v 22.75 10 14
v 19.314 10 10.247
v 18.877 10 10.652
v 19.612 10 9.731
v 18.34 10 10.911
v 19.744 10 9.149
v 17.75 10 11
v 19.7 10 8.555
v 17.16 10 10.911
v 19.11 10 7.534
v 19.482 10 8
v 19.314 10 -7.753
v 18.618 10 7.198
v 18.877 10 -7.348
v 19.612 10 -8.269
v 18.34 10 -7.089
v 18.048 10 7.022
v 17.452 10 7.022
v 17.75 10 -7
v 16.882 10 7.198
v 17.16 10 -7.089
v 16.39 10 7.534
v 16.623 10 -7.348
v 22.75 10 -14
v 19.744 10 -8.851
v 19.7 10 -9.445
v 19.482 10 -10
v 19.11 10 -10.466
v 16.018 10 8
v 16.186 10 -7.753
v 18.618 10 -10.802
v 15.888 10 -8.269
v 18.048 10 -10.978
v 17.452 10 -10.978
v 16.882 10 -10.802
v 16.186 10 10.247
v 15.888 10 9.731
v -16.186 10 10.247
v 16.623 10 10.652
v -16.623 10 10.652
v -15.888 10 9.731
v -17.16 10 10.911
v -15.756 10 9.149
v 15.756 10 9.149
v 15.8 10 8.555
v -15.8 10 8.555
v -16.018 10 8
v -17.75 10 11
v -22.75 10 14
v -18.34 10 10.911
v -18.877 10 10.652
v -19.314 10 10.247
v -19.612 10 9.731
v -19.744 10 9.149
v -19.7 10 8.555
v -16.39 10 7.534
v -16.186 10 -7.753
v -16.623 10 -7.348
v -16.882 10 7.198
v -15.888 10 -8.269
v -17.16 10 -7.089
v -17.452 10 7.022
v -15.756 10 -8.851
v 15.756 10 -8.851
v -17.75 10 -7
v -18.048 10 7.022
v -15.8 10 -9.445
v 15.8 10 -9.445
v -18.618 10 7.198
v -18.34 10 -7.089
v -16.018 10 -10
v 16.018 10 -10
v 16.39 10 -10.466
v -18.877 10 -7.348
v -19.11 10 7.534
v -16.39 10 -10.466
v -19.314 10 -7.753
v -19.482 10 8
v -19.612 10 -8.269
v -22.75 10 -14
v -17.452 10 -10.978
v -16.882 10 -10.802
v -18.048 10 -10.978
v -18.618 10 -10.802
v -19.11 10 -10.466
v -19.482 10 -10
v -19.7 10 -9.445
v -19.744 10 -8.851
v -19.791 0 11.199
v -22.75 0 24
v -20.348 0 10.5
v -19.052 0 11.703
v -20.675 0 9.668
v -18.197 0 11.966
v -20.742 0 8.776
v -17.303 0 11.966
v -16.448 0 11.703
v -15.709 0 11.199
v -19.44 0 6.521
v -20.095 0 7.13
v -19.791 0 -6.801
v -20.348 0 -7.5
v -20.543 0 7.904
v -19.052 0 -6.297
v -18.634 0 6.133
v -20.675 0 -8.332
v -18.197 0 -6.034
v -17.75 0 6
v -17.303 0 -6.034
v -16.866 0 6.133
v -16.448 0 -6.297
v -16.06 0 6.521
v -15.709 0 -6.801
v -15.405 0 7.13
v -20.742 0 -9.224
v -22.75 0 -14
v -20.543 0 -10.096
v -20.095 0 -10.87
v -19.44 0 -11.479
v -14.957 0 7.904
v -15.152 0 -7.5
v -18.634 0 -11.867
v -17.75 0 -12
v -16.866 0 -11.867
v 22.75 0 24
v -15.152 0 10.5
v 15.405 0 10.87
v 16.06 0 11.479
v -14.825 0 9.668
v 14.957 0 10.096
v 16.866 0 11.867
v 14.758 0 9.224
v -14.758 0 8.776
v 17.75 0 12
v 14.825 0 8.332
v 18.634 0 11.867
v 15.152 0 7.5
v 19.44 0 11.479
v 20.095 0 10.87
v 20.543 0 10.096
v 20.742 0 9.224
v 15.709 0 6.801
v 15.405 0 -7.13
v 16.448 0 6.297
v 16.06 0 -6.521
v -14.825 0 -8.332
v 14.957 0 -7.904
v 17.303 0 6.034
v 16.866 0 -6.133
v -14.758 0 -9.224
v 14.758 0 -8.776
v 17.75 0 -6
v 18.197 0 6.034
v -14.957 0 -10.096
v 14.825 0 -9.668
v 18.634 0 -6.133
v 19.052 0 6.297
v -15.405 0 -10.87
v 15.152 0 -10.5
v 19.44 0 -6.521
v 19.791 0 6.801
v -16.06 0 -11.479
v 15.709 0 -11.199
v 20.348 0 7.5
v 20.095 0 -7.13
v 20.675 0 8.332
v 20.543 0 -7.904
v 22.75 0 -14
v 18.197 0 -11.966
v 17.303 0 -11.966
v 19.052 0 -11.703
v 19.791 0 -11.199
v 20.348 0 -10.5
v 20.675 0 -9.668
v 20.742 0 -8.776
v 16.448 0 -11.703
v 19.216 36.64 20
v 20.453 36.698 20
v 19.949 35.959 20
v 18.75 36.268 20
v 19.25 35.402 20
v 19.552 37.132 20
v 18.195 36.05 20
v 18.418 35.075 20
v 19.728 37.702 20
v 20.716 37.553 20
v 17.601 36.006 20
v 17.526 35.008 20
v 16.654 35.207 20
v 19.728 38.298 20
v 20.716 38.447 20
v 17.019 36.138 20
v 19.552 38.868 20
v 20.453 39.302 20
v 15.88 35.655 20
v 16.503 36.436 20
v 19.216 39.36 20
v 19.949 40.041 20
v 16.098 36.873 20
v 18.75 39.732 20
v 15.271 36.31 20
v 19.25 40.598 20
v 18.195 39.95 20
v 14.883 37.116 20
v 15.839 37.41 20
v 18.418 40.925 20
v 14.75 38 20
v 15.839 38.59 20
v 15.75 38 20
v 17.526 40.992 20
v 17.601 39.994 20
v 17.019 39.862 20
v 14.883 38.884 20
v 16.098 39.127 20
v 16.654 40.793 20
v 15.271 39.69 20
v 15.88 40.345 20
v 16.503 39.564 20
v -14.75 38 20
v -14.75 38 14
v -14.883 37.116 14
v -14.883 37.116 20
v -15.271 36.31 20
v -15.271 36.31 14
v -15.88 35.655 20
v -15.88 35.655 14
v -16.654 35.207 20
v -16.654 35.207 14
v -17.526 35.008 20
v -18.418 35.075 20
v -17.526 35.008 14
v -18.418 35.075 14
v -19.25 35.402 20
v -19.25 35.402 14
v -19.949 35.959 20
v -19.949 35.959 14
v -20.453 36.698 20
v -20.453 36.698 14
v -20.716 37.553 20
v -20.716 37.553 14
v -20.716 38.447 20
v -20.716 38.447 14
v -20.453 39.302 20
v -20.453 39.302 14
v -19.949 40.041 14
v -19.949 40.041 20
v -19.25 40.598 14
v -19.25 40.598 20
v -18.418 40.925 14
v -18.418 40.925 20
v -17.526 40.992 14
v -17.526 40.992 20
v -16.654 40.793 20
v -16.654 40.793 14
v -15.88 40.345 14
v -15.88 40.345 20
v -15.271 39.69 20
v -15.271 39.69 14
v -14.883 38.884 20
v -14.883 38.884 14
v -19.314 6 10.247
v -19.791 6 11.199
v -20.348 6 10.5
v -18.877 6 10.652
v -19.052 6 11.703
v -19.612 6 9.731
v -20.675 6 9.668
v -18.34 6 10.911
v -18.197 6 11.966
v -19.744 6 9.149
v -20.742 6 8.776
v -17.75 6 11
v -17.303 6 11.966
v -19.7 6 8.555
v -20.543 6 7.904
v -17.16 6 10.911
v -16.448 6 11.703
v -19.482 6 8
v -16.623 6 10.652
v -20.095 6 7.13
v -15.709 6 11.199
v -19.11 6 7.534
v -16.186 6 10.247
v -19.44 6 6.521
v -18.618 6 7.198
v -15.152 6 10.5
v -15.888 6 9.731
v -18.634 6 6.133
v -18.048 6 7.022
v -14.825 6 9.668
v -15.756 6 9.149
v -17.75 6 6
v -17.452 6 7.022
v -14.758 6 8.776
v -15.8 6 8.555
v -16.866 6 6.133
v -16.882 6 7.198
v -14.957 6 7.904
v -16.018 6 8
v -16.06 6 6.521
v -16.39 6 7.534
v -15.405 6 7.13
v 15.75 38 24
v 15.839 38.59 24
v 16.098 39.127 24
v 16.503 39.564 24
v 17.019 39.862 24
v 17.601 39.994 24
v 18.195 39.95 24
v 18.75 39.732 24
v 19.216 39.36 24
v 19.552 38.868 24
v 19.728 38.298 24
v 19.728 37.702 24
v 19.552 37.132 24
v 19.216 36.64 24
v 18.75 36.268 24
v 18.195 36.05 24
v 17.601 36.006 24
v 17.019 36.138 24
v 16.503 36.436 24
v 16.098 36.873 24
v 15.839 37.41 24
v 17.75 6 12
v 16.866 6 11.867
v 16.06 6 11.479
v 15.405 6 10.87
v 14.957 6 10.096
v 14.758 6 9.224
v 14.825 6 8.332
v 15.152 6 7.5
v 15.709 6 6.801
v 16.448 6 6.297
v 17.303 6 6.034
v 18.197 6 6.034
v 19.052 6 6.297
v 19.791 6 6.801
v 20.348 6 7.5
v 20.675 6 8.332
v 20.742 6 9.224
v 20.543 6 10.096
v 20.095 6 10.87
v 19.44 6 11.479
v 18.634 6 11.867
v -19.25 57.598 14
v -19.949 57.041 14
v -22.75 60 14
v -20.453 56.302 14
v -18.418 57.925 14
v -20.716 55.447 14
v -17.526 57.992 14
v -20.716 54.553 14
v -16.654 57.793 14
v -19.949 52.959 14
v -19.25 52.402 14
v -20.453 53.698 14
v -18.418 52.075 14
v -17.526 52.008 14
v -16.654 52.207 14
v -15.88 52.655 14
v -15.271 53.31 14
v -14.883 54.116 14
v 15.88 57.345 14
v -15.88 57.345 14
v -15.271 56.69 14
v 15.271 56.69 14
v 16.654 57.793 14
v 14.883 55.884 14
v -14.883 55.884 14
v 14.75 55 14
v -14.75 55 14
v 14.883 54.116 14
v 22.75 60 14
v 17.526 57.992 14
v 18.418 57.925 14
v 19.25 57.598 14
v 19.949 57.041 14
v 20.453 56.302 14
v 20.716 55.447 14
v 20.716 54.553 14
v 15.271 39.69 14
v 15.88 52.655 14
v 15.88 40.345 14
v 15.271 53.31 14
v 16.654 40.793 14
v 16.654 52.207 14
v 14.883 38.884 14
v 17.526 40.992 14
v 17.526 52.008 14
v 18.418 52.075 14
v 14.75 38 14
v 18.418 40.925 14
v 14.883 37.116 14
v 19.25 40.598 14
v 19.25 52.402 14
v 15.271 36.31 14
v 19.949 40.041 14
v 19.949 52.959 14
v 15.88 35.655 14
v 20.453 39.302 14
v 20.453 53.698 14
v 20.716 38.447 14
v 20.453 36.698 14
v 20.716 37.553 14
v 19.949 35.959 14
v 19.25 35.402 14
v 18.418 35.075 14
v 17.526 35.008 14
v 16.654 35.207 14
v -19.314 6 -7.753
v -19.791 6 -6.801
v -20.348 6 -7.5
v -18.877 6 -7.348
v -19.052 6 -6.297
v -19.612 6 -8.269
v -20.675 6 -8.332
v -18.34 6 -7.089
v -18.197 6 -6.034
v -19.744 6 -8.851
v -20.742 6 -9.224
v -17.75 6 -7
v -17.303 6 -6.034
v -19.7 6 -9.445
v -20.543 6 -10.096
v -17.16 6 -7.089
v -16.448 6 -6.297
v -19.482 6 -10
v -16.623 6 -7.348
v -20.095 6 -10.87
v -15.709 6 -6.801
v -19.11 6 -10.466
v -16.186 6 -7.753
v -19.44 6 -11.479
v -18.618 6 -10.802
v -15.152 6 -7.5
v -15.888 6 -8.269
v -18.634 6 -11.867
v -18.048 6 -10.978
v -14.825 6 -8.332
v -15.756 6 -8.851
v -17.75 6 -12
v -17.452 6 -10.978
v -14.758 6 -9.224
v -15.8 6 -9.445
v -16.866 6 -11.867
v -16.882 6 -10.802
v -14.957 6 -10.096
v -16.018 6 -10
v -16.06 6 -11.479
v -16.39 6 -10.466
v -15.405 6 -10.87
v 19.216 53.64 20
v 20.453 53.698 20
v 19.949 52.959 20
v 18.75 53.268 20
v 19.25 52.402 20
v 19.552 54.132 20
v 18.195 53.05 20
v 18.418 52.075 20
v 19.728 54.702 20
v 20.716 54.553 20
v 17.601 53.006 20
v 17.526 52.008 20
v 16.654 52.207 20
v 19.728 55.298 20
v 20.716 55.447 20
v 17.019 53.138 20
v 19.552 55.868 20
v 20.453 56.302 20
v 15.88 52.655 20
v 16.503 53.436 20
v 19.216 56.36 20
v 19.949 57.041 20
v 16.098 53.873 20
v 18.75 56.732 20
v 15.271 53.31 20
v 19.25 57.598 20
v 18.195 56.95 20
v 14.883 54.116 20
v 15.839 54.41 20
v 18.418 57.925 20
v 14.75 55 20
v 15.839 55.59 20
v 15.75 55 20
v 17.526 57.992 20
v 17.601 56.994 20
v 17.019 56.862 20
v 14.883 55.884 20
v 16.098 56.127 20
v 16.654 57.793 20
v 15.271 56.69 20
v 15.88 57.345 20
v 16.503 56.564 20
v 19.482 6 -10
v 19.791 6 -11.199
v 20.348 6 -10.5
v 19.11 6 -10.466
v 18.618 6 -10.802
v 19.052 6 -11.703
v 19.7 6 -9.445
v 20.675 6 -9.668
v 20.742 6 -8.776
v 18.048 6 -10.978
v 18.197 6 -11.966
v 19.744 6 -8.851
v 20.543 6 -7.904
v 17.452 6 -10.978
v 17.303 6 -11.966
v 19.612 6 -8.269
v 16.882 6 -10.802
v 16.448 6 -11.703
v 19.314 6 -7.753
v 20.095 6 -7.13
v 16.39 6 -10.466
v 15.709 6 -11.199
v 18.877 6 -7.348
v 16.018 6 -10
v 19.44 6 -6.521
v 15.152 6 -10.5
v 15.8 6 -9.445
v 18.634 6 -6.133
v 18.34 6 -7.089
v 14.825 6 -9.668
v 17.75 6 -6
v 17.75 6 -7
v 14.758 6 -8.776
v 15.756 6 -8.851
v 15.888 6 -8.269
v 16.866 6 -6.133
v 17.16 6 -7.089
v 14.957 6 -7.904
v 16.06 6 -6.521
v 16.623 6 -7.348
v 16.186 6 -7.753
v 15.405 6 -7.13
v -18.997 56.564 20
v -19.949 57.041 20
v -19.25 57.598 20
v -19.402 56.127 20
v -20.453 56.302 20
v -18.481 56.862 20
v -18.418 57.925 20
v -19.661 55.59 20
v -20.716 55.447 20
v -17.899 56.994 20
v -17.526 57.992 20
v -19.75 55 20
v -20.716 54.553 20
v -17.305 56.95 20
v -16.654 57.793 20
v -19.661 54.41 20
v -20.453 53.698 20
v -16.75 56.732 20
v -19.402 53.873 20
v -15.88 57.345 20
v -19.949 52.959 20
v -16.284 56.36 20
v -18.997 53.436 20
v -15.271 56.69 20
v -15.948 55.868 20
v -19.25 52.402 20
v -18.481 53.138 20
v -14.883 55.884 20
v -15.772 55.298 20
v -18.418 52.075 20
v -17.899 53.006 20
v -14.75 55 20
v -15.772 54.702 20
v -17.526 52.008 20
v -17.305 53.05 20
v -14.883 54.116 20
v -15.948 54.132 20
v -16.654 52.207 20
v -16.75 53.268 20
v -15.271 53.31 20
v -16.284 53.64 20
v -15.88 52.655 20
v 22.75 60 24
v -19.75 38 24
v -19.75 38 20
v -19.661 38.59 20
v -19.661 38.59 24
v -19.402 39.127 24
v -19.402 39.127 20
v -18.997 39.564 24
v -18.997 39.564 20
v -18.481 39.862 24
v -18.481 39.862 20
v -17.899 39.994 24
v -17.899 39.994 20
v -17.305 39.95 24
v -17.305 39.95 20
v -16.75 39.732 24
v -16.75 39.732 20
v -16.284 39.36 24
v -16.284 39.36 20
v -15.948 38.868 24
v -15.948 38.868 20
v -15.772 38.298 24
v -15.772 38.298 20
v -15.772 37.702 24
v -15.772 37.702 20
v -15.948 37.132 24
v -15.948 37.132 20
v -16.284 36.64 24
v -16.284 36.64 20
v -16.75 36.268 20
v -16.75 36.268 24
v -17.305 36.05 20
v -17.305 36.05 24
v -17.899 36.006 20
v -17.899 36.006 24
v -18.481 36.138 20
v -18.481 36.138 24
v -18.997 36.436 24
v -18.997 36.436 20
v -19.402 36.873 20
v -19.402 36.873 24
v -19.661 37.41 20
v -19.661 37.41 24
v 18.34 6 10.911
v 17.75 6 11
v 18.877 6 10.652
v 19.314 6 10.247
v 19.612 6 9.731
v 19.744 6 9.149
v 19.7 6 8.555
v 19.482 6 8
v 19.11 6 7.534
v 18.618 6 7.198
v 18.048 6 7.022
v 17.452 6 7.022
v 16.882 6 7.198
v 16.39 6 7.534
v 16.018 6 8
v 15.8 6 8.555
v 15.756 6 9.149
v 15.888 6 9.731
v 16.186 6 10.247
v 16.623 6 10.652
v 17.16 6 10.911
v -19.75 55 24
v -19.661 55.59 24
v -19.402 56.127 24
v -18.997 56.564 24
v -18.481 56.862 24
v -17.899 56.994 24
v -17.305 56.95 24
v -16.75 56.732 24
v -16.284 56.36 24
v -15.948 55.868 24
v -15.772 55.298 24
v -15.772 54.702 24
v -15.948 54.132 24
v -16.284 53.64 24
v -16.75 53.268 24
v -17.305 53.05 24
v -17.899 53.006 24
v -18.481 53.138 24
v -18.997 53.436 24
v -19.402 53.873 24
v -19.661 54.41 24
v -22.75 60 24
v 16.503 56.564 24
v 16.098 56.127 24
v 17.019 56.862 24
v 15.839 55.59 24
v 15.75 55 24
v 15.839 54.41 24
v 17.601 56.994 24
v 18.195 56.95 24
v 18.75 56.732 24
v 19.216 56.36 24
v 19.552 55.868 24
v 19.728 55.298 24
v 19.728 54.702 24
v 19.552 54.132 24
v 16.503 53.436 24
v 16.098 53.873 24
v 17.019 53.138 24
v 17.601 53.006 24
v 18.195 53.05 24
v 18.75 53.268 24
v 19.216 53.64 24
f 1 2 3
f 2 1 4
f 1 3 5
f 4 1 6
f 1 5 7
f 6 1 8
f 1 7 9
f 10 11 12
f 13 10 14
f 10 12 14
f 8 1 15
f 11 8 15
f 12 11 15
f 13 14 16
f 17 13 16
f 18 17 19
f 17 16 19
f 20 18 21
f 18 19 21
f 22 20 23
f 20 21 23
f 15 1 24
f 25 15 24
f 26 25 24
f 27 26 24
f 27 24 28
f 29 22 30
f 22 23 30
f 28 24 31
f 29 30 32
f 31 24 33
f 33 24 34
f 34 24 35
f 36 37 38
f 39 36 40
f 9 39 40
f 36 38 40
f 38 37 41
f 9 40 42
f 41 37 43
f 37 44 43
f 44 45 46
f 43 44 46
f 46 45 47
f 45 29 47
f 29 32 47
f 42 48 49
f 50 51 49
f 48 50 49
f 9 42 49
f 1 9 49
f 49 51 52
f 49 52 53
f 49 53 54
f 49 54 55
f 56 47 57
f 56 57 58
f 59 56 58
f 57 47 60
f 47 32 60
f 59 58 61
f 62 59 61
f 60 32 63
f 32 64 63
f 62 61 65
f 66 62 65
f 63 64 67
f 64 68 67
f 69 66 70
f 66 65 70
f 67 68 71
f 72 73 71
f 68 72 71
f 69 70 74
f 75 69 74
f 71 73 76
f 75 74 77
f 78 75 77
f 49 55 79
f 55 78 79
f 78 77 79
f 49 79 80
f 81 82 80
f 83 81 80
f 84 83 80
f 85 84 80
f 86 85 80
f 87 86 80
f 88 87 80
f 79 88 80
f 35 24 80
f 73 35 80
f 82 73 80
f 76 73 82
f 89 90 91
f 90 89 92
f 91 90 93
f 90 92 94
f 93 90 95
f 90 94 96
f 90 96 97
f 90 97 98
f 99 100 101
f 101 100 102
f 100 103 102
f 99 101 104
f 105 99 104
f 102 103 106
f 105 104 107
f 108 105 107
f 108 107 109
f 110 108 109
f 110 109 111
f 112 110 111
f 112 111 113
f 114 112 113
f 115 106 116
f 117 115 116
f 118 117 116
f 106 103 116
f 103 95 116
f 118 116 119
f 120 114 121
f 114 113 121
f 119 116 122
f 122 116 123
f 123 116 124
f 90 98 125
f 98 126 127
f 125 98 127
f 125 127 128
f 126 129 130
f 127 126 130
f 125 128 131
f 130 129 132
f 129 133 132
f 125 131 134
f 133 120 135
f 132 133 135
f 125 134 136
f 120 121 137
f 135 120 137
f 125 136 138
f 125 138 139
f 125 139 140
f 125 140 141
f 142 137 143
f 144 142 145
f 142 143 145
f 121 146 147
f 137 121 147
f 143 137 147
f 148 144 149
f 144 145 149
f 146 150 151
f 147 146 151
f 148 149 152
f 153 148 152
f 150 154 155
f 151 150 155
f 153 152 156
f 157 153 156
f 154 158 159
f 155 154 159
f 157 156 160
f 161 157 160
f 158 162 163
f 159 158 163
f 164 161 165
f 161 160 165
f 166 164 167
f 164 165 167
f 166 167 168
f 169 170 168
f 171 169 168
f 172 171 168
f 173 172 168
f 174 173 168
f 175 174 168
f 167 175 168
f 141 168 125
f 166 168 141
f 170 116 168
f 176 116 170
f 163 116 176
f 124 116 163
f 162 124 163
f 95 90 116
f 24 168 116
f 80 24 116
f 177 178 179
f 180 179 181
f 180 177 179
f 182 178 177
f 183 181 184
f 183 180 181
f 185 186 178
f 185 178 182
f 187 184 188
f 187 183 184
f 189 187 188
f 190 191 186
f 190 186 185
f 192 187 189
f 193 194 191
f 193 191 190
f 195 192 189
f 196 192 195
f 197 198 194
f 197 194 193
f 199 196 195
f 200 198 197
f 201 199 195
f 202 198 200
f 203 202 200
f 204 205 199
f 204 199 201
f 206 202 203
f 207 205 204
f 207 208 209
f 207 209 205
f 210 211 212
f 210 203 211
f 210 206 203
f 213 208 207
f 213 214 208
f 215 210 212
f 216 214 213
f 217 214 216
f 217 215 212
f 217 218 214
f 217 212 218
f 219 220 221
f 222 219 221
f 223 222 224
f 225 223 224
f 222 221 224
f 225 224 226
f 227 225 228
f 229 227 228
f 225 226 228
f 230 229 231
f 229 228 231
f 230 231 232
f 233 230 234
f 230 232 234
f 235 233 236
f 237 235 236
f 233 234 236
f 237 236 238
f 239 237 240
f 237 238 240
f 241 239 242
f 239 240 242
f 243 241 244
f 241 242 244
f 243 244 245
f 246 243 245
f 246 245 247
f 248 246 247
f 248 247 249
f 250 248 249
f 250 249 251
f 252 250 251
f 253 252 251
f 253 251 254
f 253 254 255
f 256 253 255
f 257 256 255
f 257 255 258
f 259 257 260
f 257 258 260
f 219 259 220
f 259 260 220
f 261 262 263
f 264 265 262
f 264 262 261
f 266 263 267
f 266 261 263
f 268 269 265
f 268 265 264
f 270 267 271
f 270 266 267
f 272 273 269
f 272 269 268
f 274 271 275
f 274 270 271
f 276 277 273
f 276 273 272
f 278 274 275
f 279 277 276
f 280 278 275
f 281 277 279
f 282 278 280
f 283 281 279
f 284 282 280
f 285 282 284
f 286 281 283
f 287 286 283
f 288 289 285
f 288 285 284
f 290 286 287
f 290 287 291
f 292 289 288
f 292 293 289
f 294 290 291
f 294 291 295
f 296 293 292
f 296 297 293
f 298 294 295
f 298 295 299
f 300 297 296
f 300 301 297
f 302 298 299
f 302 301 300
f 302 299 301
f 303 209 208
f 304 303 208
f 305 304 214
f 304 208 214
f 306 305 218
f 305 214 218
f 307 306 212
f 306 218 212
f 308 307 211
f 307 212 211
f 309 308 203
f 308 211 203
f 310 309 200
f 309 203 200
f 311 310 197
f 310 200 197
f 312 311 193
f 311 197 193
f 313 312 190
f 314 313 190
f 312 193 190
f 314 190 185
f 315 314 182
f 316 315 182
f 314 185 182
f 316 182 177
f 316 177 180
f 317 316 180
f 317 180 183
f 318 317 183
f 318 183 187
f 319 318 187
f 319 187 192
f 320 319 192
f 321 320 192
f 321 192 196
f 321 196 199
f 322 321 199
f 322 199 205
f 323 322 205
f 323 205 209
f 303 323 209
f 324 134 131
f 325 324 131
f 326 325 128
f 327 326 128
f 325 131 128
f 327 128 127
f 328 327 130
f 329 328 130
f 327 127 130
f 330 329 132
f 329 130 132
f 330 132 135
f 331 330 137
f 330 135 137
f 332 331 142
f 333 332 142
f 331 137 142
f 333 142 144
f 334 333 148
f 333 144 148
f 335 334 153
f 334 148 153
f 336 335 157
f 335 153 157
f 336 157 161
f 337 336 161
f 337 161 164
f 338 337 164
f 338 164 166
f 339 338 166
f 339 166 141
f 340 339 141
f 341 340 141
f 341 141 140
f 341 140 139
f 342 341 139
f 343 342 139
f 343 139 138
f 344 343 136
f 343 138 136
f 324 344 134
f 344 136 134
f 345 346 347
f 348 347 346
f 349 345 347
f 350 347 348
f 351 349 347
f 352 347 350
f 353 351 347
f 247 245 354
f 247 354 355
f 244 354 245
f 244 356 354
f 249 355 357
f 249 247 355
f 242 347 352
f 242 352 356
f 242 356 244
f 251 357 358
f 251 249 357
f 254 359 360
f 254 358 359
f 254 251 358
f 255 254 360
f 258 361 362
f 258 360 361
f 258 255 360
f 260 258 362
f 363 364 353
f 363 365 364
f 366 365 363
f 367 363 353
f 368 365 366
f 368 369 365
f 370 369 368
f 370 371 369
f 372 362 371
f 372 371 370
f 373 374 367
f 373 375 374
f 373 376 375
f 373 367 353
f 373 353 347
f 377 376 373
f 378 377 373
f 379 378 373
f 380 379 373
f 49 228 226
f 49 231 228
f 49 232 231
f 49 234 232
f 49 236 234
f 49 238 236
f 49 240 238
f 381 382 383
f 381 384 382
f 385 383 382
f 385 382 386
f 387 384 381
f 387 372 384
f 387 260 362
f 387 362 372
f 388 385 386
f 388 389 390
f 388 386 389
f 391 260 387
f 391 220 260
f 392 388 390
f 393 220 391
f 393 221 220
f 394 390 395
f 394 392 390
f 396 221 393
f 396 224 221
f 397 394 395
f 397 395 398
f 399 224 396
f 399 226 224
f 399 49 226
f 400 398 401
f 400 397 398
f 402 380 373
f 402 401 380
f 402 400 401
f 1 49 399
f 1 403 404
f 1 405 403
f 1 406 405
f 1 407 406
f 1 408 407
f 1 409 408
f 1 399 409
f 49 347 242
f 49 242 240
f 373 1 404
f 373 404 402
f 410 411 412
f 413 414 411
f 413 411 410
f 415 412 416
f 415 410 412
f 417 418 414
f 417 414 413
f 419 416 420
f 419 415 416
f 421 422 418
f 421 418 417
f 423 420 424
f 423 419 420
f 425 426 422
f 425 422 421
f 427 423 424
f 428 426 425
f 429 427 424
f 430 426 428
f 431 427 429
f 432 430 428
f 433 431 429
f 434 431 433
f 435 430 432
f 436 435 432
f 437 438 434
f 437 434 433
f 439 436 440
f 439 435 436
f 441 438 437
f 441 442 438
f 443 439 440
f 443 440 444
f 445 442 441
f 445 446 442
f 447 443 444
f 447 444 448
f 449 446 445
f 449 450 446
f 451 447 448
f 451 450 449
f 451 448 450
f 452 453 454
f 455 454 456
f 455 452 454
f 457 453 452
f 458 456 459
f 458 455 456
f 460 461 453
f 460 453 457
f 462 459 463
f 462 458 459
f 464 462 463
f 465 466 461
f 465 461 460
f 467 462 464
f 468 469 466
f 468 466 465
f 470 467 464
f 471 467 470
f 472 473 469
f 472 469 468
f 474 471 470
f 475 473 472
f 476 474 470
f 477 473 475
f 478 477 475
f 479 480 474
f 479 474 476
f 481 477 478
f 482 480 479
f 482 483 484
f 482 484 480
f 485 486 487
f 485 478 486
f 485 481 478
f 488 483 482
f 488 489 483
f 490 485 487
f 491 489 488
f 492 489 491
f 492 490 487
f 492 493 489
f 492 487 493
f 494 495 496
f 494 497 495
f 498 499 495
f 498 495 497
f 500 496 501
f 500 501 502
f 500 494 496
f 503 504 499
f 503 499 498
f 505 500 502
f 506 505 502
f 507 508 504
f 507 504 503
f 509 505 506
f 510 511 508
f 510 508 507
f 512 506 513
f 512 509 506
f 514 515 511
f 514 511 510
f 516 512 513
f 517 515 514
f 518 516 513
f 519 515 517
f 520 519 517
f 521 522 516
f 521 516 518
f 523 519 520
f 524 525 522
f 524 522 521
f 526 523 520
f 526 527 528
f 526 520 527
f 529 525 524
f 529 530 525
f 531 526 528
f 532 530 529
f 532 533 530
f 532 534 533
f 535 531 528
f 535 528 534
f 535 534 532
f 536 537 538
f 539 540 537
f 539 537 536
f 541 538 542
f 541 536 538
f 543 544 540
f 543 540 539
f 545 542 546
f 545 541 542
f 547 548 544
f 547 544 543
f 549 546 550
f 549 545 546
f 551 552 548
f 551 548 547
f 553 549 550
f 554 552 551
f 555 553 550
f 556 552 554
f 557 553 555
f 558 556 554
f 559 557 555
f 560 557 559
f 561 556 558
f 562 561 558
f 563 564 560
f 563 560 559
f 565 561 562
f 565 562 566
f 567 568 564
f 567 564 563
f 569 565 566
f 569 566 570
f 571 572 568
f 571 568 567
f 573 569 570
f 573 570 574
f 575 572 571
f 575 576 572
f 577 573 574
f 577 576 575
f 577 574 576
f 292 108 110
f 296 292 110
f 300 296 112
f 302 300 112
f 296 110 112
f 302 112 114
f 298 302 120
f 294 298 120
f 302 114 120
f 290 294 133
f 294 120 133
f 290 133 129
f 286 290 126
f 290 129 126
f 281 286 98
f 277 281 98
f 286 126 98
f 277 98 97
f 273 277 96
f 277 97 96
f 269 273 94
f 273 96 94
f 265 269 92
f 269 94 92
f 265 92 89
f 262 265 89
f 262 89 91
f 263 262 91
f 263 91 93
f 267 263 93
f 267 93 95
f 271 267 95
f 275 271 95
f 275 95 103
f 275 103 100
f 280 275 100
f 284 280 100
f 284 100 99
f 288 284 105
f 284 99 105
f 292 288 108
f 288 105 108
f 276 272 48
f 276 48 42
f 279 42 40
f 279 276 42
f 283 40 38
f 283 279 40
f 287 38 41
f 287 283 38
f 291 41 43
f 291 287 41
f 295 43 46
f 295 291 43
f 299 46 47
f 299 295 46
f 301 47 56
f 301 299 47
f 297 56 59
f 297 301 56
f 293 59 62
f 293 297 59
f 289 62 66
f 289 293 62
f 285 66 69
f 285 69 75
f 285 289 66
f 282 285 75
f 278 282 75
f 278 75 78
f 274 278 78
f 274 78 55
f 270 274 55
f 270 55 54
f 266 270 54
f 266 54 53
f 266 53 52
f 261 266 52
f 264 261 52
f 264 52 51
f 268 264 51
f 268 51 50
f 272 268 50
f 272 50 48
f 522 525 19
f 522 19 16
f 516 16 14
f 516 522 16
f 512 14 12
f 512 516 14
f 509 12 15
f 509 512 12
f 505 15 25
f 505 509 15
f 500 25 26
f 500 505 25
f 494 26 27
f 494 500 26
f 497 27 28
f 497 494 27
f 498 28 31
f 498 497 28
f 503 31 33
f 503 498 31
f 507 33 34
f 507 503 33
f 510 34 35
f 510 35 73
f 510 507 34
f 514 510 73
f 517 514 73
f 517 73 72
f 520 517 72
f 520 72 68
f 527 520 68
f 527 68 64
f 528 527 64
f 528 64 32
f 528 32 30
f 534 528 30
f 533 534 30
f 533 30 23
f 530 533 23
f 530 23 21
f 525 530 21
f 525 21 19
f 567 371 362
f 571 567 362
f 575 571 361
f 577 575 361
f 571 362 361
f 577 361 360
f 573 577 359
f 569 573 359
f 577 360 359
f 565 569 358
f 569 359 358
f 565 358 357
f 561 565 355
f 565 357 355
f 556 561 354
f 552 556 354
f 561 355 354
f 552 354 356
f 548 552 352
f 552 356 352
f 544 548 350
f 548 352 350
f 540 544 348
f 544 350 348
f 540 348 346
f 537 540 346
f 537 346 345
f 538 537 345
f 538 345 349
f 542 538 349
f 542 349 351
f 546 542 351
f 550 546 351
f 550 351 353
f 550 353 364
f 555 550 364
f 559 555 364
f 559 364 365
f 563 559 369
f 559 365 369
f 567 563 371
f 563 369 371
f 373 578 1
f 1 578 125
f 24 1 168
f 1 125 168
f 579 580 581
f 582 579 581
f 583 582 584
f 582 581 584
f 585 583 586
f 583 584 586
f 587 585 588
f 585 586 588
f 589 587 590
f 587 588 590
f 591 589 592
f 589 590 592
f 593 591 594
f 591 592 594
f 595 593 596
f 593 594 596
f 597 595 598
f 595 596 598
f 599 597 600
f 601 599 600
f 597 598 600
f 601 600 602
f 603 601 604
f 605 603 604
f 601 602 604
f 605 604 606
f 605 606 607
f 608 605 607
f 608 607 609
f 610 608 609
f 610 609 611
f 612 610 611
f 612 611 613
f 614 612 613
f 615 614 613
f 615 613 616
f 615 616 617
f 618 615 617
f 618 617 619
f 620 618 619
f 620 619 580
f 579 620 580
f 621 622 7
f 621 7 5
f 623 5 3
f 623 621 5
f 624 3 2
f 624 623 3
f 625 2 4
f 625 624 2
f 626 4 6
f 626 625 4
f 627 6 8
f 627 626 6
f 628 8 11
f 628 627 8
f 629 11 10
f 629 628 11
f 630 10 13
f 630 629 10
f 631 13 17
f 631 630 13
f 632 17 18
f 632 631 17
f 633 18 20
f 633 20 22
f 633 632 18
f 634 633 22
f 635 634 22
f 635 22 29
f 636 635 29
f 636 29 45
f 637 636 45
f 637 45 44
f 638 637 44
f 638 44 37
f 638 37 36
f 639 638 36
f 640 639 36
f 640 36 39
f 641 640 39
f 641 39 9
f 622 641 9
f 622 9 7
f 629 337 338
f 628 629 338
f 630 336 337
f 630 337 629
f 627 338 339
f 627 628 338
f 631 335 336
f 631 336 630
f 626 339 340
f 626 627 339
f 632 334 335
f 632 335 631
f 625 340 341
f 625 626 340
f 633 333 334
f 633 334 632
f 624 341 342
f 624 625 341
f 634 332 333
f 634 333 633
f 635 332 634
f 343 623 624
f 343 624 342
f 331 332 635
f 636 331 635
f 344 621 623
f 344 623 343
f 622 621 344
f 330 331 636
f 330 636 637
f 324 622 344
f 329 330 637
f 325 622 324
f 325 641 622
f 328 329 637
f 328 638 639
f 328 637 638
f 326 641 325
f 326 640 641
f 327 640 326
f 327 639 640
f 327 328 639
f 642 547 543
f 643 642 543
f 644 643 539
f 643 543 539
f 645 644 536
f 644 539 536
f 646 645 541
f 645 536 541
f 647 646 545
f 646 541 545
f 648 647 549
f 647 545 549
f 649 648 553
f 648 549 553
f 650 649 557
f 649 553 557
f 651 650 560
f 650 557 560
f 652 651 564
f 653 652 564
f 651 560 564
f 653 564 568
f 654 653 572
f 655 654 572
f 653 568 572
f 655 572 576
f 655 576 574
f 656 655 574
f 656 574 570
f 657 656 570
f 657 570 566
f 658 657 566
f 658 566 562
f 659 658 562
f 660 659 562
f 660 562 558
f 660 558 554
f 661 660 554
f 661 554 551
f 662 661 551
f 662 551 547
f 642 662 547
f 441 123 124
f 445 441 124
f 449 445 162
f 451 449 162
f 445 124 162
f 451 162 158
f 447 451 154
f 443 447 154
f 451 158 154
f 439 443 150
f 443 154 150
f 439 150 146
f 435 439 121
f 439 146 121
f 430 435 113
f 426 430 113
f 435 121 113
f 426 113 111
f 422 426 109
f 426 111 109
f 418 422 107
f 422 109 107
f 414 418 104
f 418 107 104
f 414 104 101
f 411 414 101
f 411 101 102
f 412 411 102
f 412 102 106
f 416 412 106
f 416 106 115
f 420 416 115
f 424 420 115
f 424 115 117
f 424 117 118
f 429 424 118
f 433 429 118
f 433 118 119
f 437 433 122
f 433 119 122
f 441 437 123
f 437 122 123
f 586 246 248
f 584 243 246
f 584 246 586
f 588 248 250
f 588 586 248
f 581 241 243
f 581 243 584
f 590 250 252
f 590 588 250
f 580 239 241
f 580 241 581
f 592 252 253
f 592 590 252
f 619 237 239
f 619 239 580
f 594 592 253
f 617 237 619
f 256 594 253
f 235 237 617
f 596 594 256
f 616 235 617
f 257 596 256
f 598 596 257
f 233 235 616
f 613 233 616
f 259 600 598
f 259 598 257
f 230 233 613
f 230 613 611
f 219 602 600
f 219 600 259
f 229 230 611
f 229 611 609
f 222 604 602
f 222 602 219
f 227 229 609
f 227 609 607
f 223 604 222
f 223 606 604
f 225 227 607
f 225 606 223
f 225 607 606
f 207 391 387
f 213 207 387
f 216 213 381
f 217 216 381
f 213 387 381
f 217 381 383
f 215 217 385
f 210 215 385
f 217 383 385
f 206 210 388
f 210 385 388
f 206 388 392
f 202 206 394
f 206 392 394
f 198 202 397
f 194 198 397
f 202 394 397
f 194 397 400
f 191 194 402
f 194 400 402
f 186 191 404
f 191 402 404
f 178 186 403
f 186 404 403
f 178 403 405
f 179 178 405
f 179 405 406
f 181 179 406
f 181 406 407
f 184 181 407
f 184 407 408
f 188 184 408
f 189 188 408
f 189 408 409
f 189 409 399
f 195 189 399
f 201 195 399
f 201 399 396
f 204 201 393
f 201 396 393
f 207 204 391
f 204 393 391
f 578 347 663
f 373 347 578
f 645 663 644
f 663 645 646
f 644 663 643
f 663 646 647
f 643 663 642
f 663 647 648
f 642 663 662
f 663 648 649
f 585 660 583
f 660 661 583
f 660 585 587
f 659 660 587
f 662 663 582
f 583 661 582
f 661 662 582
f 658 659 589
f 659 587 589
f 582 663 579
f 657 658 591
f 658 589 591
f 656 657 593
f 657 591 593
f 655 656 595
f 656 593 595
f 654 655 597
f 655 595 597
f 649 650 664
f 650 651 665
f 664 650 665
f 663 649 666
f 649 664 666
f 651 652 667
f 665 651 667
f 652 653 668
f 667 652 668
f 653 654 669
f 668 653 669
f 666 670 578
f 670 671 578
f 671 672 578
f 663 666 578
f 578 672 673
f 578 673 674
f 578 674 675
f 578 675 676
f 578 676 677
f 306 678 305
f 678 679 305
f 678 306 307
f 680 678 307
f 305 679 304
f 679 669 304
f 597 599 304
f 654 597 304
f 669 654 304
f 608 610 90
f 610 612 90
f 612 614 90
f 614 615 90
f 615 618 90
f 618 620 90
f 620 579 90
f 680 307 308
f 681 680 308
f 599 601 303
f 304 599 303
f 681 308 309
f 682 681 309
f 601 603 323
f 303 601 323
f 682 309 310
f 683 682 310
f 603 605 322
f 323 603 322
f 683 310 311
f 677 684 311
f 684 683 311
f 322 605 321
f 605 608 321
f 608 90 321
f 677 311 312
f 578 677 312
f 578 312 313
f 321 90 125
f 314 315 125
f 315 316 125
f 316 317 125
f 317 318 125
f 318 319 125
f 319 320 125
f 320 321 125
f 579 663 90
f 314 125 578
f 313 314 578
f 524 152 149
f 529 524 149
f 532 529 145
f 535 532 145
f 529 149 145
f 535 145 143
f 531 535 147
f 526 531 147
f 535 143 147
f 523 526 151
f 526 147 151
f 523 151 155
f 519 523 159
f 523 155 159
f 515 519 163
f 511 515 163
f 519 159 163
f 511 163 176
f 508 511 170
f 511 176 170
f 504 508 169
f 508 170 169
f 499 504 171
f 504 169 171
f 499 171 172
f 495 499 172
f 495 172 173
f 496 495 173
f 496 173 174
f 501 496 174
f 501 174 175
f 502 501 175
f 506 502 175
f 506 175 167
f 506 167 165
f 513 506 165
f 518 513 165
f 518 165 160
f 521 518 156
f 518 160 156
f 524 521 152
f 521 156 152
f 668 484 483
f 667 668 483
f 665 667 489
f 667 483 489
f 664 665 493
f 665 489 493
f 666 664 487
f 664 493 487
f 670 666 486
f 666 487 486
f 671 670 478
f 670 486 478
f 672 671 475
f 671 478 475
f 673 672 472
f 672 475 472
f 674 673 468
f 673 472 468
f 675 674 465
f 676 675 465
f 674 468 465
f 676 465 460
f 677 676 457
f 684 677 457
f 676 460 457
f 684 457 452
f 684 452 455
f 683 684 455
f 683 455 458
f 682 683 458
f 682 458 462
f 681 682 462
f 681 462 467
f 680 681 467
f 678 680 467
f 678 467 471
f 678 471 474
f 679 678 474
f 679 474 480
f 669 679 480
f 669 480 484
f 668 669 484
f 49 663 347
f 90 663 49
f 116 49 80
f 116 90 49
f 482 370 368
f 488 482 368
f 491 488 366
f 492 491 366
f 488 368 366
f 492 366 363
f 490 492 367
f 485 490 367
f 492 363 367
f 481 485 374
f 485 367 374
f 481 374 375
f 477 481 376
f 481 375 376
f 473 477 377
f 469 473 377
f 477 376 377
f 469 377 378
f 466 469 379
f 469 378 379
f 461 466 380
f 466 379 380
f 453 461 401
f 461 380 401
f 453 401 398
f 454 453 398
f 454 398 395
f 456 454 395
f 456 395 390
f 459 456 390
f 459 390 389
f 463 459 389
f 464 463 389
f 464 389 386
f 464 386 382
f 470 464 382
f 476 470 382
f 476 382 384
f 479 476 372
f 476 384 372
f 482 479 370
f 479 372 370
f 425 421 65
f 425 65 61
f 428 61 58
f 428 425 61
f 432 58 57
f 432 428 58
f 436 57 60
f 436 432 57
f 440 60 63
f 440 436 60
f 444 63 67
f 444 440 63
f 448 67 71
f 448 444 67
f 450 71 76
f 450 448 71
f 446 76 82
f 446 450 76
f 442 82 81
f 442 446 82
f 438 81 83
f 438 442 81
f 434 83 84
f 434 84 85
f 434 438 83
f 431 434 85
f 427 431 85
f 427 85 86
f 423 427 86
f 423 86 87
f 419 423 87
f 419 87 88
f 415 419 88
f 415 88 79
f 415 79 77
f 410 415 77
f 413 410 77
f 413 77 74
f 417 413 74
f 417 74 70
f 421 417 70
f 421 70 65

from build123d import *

# Parameters (mm, degrees)
SKETCH1_R              = 2
BASE_EXTRUSION_DEPTH   = 10
SKETCH2_R              = 3
FIRST_BASE_HOLES_DEPTH = 6
SKETCH5_W              = 45.5
SKETCH5_H              = 10
BOSS_EXTRUDE3_DEPTH    = 60
CUT_EXTRUDE2_REACH     = 72.011
SKETCH6_R              = 2
SKETCH7_R              = 3
CUT_EXTRUDE3_DEPTH     = 6


with BuildPart() as part:
    # Sketch1 → Base Extrusion (new body)
    with BuildSketch(Plane(origin=(0, 0, 0), x_dir=(1, 0, 0), z_dir=(0, 1, 0))):
        Polygon((-22.75, 14), (0, 14), (22.75, 14), (22.75, -14), (-22.75, -14), align=None)
        with Locations(Location((-17.75, 9, 0), (0, 0, 270))):
            Circle(SKETCH1_R, mode=Mode.SUBTRACT)
        with Locations(Location((-17.75, -9, 0), (0, 0, 270))):
            Circle(SKETCH1_R, mode=Mode.SUBTRACT)
        with Locations(Location((17.75, 9, 0), (0, 0, 270))):
            Circle(SKETCH1_R, mode=Mode.SUBTRACT)
        with Locations(Location((17.75, -9, 0), (0, 0, 270))):
            Circle(SKETCH1_R, mode=Mode.SUBTRACT)
    extrude(amount=BASE_EXTRUSION_DEPTH)

    # Sketch2 → First Base Holes (cut)
    with BuildSketch(Plane.XZ):
        with Locations(Location((-17.75, 9, 0), (0, 0, 270))):
            Circle(SKETCH2_R)
        with Locations(Location((-17.75, -9, 0), (0, 0, 270))):
            Circle(SKETCH2_R)
        with Locations(Location((17.75, -9, 0), (0, 0, 90))):
            Circle(SKETCH2_R)
        with Locations(Location((17.75, 9, 0), (0, 0, 90))):
            Circle(SKETCH2_R)
    extrude(amount=-FIRST_BASE_HOLES_DEPTH, mode=Mode.SUBTRACT)

    # Sketch5 → Boss-Extrude3 (add)
    with BuildSketch(Plane(origin=(0, 0, 0), x_dir=(1, 0, 0), z_dir=(0, 1, 0))):
        with Locations((0, -19)):
            Rectangle(SKETCH5_W, SKETCH5_H)
    extrude(amount=BOSS_EXTRUDE3_DEPTH)

    # Sketch6 → Cut-Extrude2 (cut, up to next)
    with BuildSketch(Plane(origin=(0, 0, 14), x_dir=(-1, 0, 0), z_dir=(0, 0, -1)), mode=Mode.PRIVATE) as cut_extrude2_sk1:
        with Locations((-17.75, 55)):
            Circle(SKETCH6_R)
    cut_extrude2_tool1 = extrude(cut_extrude2_sk1.sketch, amount=-CUT_EXTRUDE2_REACH, mode=Mode.PRIVATE) & part.part
    # Sketch6 → Cut-Extrude2 (cut, up to next)
    with BuildSketch(Plane(origin=(0, 0, 14), x_dir=(-1, 0, 0), z_dir=(0, 0, -1)), mode=Mode.PRIVATE) as cut_extrude2_sk2:
        with Locations((-17.75, 38)):
            Circle(SKETCH6_R)
    cut_extrude2_tool2 = extrude(cut_extrude2_sk2.sketch, amount=-CUT_EXTRUDE2_REACH, mode=Mode.PRIVATE) & part.part
    # Sketch6 → Cut-Extrude2 (cut, up to next)
    with BuildSketch(Plane(origin=(0, 0, 14), x_dir=(-1, 0, 0), z_dir=(0, 0, -1)), mode=Mode.PRIVATE) as cut_extrude2_sk3:
        with Locations((17.75, 55)):
            Circle(SKETCH6_R)
    cut_extrude2_tool3 = extrude(cut_extrude2_sk3.sketch, amount=-CUT_EXTRUDE2_REACH, mode=Mode.PRIVATE) & part.part
    # Sketch6 → Cut-Extrude2 (cut, up to next)
    with BuildSketch(Plane(origin=(0, 0, 14), x_dir=(-1, 0, 0), z_dir=(0, 0, -1)), mode=Mode.PRIVATE) as cut_extrude2_sk4:
        with Locations((17.75, 38)):
            Circle(SKETCH6_R)
    cut_extrude2_tool4 = extrude(cut_extrude2_sk4.sketch, amount=-CUT_EXTRUDE2_REACH, mode=Mode.PRIVATE) & part.part
    add(cut_extrude2_tool1.solids().sort_by_distance((17.75, 55, 14))[0], mode=Mode.SUBTRACT)
    add(cut_extrude2_tool2.solids().sort_by_distance((17.75, 38, 14))[0], mode=Mode.SUBTRACT)
    add(cut_extrude2_tool3.solids().sort_by_distance((-17.75, 55, 14))[0], mode=Mode.SUBTRACT)
    add(cut_extrude2_tool4.solids().sort_by_distance((-17.75, 38, 14))[0], mode=Mode.SUBTRACT)

    # Sketch7 → Cut-Extrude3 (cut)
    with BuildSketch(Plane(origin=(0, 0, 14), x_dir=(-1, 0, 0), z_dir=(0, 0, -1))):
        with Locations((-17.75, 55)):
            Circle(SKETCH7_R)
        with Locations((-17.75, 38)):
            Circle(SKETCH7_R)
        with Locations(Location((17.75, 38, 0), (0, 0, 180))):
            Circle(SKETCH7_R)
        with Locations(Location((17.75, 55, 0), (0, 0, 180))):
            Circle(SKETCH7_R)
    extrude(amount=-CUT_EXTRUDE3_DEPTH, mode=Mode.SUBTRACT)


solid = part.part
